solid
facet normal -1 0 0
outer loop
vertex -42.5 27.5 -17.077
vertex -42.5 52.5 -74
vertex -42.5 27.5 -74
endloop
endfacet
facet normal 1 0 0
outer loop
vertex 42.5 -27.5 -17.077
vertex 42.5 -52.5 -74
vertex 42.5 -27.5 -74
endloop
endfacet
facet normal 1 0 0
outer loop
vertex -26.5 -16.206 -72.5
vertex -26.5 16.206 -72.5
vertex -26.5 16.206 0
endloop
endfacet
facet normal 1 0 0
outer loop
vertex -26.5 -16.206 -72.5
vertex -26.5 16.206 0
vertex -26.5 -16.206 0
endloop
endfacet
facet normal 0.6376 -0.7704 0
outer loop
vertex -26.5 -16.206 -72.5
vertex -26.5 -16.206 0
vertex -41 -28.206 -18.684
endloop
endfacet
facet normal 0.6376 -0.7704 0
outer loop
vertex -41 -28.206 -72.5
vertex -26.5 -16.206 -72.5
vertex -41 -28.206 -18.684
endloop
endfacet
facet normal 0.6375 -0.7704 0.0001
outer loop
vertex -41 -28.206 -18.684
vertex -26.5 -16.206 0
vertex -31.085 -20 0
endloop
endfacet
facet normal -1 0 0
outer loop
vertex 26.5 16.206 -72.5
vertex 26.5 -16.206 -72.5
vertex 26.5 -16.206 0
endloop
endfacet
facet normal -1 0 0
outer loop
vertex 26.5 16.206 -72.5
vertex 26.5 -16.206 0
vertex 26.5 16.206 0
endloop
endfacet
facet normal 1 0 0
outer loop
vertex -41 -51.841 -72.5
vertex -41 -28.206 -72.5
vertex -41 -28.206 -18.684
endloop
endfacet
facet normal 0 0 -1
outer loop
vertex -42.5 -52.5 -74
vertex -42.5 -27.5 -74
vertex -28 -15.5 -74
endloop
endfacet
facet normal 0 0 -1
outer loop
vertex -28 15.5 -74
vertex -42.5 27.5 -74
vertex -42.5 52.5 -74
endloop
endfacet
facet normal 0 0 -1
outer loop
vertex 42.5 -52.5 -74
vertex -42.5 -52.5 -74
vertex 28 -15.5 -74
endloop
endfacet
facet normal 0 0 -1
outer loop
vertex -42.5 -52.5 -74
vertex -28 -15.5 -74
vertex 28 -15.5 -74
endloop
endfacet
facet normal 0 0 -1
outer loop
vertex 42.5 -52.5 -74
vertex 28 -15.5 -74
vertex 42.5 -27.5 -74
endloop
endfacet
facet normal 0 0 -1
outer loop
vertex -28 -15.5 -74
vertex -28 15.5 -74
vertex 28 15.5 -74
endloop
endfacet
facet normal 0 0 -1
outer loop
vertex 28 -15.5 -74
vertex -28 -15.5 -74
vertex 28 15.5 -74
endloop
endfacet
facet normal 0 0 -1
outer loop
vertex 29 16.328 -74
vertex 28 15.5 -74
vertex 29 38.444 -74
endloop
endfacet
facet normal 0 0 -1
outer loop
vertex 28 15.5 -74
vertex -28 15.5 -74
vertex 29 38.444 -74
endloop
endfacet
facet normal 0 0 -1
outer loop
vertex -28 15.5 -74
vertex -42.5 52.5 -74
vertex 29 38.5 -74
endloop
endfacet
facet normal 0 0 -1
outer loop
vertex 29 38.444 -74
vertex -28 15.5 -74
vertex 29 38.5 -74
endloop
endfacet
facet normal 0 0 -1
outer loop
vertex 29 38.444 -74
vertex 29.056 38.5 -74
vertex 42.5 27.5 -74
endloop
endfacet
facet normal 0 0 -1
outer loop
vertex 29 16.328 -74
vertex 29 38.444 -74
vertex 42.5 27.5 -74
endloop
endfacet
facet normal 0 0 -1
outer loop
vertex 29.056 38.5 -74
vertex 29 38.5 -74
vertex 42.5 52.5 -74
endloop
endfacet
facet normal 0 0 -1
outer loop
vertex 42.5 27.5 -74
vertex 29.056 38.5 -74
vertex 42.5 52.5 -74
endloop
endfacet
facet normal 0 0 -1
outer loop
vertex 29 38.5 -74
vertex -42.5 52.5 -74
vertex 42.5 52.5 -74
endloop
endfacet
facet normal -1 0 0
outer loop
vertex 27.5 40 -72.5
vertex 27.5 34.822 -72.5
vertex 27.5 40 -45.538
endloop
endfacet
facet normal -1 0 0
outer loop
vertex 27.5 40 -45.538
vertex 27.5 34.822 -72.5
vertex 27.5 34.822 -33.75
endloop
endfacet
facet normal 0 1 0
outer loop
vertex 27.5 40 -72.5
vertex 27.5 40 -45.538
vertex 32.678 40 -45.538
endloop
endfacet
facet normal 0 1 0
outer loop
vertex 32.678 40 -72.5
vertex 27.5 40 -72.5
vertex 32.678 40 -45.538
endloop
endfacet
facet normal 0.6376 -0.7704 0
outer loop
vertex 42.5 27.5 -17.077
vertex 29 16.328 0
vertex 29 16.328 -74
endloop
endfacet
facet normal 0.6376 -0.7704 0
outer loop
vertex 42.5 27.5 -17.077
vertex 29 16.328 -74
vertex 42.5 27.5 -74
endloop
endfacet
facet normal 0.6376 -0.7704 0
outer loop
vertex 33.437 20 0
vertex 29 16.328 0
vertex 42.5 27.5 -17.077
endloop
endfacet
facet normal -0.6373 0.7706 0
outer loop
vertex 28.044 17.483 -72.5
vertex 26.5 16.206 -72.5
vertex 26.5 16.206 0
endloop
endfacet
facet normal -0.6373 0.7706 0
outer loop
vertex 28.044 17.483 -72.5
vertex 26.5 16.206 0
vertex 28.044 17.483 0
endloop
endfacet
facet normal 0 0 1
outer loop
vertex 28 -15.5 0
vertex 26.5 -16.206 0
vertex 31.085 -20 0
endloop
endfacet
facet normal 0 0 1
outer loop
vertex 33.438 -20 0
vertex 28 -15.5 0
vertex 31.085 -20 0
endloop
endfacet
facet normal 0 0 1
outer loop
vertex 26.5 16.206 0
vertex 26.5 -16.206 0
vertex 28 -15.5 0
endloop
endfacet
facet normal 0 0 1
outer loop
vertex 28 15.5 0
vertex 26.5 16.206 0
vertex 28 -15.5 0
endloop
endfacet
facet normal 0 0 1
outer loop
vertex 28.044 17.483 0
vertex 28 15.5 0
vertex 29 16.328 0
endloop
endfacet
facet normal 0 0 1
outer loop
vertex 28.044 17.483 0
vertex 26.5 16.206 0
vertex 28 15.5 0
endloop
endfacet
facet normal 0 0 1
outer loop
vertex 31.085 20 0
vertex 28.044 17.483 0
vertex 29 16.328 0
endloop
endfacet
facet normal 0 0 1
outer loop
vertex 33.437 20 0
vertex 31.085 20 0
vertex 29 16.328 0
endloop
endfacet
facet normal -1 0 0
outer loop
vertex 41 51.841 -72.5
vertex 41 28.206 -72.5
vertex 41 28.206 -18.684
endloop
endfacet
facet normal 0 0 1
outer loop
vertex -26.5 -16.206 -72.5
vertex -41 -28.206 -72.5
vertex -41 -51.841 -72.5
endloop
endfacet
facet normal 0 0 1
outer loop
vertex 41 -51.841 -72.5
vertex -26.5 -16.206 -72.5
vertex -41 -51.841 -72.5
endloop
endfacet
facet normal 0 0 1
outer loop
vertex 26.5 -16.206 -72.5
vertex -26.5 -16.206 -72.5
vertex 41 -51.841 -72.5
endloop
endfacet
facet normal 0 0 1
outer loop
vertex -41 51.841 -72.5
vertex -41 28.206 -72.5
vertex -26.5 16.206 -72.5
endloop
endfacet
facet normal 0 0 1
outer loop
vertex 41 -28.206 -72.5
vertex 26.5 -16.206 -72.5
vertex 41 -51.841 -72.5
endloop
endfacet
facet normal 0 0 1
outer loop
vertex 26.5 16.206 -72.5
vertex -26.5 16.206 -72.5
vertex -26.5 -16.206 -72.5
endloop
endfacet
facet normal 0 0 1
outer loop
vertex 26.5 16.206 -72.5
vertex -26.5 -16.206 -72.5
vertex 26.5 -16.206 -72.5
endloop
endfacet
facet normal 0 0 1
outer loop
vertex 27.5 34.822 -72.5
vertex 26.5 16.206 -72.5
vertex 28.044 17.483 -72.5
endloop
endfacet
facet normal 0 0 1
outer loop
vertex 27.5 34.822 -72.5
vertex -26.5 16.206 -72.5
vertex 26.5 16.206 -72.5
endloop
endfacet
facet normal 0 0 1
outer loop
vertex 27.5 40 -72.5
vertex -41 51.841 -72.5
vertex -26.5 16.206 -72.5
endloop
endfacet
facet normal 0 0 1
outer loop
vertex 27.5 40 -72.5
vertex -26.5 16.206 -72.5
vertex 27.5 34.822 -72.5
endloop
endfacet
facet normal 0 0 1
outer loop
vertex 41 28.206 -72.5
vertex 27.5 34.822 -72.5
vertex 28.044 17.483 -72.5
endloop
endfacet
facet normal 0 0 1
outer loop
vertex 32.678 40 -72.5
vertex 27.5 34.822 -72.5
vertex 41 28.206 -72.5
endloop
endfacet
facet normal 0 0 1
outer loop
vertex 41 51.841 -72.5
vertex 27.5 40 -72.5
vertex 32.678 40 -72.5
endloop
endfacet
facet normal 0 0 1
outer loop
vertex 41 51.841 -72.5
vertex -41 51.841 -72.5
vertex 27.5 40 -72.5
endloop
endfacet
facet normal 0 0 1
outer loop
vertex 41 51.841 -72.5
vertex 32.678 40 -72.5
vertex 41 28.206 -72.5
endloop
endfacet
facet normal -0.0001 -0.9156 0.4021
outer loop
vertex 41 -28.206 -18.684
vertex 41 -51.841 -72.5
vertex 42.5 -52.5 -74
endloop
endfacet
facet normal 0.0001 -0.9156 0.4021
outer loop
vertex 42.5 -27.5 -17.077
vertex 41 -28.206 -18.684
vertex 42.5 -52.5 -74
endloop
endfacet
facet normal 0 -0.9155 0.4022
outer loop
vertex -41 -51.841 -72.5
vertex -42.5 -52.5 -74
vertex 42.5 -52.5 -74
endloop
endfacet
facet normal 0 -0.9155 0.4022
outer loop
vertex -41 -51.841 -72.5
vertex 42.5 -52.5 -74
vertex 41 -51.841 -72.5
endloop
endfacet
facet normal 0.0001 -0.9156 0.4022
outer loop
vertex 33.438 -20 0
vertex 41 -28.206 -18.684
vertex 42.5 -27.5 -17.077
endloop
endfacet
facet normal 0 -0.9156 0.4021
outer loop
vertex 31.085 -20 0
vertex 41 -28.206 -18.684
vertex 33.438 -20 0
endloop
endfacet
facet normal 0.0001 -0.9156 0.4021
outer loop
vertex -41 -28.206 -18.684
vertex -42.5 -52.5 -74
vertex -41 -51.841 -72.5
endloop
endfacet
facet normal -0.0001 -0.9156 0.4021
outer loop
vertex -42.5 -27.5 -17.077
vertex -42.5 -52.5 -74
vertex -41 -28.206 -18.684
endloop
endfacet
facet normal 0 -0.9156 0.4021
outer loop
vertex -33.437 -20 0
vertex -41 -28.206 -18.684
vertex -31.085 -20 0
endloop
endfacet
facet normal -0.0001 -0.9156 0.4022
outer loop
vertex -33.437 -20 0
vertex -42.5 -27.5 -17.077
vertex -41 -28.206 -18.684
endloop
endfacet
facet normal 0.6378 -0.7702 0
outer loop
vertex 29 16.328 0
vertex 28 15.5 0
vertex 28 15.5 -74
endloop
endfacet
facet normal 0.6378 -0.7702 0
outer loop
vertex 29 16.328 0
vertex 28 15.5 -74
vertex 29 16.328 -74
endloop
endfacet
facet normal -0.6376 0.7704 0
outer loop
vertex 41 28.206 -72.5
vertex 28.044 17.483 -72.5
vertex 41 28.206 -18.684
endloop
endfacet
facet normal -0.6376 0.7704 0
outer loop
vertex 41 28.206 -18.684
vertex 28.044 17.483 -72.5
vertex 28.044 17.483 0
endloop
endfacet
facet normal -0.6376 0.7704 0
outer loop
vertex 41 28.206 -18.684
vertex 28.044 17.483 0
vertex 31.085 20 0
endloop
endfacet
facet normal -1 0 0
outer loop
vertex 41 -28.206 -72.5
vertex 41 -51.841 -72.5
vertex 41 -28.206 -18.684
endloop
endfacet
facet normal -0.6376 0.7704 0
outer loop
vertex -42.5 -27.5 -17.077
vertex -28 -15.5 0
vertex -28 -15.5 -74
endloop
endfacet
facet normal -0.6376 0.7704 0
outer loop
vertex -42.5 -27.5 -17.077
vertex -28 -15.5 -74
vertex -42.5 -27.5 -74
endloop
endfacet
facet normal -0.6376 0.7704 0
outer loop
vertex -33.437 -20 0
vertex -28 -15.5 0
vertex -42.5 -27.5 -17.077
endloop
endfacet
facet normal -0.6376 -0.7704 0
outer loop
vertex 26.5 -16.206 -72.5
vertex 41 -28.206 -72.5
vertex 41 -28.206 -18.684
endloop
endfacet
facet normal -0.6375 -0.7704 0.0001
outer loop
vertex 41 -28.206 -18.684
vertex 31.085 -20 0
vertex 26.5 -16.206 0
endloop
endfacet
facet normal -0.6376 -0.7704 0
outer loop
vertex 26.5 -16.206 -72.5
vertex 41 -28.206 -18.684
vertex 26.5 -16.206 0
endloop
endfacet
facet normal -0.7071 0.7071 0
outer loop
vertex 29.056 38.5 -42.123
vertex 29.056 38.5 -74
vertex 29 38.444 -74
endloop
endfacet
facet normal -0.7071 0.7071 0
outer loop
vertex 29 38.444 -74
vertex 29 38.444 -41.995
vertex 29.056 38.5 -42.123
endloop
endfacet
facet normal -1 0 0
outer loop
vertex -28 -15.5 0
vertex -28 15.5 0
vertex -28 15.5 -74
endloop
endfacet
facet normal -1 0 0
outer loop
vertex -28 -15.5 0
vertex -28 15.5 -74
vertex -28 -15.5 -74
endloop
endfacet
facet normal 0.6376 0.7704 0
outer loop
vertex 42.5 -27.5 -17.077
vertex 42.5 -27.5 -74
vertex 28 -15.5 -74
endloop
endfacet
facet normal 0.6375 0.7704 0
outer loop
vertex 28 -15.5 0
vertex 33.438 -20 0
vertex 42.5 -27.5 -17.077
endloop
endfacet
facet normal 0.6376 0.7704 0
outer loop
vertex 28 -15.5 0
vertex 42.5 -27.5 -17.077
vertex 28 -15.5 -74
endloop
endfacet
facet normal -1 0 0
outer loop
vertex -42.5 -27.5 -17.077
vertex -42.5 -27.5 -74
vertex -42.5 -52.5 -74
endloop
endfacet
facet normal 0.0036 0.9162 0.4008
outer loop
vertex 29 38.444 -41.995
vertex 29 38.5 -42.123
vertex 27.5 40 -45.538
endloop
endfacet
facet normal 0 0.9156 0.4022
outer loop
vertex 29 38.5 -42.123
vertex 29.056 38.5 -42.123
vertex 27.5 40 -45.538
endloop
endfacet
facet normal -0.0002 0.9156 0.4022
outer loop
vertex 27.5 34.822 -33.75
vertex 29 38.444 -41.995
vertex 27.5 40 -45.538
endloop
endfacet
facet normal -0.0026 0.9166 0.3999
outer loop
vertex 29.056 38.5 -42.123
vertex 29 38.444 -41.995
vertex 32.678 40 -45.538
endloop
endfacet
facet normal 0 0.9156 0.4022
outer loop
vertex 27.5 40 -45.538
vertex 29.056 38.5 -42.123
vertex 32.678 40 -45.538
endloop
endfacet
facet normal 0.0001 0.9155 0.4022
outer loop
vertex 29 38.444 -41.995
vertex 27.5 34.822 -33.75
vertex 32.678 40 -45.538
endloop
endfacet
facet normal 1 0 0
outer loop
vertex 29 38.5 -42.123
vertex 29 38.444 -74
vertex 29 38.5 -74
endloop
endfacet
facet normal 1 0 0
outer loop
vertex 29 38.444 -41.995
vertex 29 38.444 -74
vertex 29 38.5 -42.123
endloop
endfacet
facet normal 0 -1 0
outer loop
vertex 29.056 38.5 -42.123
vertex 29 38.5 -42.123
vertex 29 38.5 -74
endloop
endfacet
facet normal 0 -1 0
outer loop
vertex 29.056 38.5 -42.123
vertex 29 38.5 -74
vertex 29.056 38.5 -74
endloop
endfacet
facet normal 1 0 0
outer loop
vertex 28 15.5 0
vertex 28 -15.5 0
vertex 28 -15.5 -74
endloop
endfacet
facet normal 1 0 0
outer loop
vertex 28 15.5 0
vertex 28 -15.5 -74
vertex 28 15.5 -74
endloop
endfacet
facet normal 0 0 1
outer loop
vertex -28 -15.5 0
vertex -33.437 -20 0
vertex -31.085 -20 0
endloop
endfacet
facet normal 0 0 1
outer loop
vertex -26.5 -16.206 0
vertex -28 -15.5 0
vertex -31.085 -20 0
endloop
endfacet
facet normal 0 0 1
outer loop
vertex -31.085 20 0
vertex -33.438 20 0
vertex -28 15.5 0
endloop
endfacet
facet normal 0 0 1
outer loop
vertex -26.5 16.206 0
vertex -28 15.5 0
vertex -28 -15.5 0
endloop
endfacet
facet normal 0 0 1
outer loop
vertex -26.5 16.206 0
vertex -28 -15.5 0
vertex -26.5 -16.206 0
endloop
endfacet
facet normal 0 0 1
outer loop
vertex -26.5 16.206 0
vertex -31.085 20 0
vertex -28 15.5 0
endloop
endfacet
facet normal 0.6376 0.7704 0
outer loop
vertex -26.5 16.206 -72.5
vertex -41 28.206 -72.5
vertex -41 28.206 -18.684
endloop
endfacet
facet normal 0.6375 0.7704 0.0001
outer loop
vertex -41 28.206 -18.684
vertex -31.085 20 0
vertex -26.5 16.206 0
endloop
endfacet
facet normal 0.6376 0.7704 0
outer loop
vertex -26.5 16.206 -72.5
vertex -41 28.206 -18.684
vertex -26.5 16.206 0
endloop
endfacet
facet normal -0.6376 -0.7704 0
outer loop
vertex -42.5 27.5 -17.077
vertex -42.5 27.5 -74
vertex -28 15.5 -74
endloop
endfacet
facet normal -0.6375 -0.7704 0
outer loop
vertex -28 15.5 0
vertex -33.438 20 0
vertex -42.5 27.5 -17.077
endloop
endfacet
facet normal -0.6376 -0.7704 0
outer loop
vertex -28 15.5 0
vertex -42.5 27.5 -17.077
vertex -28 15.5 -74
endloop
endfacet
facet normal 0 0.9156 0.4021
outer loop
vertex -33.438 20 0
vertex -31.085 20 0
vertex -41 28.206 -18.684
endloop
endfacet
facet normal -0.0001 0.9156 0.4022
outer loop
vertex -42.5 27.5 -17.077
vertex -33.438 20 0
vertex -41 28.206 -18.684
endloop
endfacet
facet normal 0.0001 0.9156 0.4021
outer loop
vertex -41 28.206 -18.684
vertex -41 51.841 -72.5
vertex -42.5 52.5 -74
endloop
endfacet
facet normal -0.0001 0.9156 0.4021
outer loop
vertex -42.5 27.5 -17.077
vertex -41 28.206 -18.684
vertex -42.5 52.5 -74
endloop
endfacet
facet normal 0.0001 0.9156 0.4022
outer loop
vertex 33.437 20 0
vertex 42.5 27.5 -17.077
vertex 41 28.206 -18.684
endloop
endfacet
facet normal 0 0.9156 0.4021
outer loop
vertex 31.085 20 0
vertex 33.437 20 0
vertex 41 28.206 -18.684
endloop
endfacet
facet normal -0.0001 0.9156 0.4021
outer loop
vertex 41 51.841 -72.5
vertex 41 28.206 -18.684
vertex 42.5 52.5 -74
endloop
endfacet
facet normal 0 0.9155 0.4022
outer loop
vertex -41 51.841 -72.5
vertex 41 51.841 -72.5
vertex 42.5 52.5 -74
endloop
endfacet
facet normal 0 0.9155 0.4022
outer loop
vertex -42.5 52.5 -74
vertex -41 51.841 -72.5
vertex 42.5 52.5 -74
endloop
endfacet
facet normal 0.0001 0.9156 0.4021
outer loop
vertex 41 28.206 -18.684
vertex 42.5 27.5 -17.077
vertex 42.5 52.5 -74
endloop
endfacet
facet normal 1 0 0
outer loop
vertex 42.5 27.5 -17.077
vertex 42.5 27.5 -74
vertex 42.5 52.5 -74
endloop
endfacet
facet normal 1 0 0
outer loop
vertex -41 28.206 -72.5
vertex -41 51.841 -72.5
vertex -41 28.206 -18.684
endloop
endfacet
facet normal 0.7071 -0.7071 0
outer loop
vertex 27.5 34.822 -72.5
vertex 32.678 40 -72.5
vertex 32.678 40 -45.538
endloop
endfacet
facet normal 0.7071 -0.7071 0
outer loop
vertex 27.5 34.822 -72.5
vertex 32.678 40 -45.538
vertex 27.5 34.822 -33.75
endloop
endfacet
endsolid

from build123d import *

# Parameters (mm, degrees)
F1_DEPTH = 74
F3_DEPTH = 50
F4_T     = -1.5


with BuildPart() as f1:
    # F0 (on Top) → F1 (new body)
    with BuildSketch(Plane.XY):
        Polygon((42.5, 27.5), (42.5, 52.5), (-42.5, 52.5), (-42.5, 27.5), (-28, 15.5), (-28, -15.5), (-42.5, -27.5), (-42.5, -52.5), (42.5, -52.5), (42.5, -27.5), (28, -15.5), (28, 15.5), (29, 16.3275862069), align=None)
        with BuildLine():
            Line((-34.6619805153, -37.7418373828), (-29.712233047, -32.7920899145))
            ThreePointArc((-29.712233047, -32.7920899145), (-23.3482720164, -32.7920899145), (-23.3482720164, -39.1560509451))
            Line((-23.3482720164, -39.1560509451), (-28.2980194847, -44.1057984134))
            ThreePointArc((-28.2980194847, -44.1057984134), (-34.6619805153, -44.1057984134), (-34.6619805153, -37.7418373828))
        make_face(mode=Mode.SUBTRACT)
        with BuildLine():
            ThreePointArc((34.6619805153, -37.7418373828), (34.6619805153, -44.1057984134), (28.2980194847, -44.1057984134))
            Line((28.2980194847, -44.1057984134), (23.3482720164, -39.1560509451))
            ThreePointArc((23.3482720164, -39.1560509451), (23.3482720164, -32.7920899145), (29.712233047, -32.7920899145))
            Line((29.712233047, -32.7920899145), (34.6619805153, -37.7418373828))
        make_face(mode=Mode.SUBTRACT)
        with BuildLine():
            ThreePointArc((-34.6619805153, 37.7418373828), (-34.6619805153, 44.1057984134), (-28.2980194847, 44.1057984134))
            Line((-28.2980194847, 44.1057984134), (-23.3482720164, 39.1560509451))
            ThreePointArc((-23.3482720164, 39.1560509451), (-23.3482720164, 32.7920899145), (-29.712233047, 32.7920899145))
            Line((-29.712233047, 32.7920899145), (-34.6619805153, 37.7418373828))
        make_face(mode=Mode.SUBTRACT)
        with BuildLine():
            ThreePointArc((29.712233047, 32.7920899145), (29.3709433721, 32.4840166266), (29, 32.2123756731))
            ThreePointArc((29, 32.2123756731), (23.3244813451, 32.8160598061), (22.8060506298, 38.5))
            ThreePointArc((22.8060506298, 38.5), (23.0616159687, 38.8408735961), (23.3482720164, 39.1560509451))
            Line((23.3482720164, 39.1560509451), (28.2980194847, 44.1057984134))
            ThreePointArc((28.2980194847, 44.1057984134), (28.6345514487, 44.4099938176), (29, 44.6787613065))
            ThreePointArc((29, 44.6787613065), (34.6382034894, 44.1293990809), (35.2714518059, 38.5))
            ThreePointArc((35.2714518059, 38.5), (34.9872627822, 38.1044016861), (34.6619805153, 37.7418373828))
            Line((34.6619805153, 37.7418373828), (29.712233047, 32.7920899145))
        make_face(mode=Mode.SUBTRACT)
        with BuildLine():
            Line((23.3482720164, -39.1560509451), (28.2980194847, -44.1057984134))
            ThreePointArc((28.2980194847, -44.1057984134), (34.6619805153, -44.1057984134), (34.6619805153, -37.7418373828))
            Line((34.6619805153, -37.7418373828), (29.712233047, -32.7920899145))
            ThreePointArc((29.712233047, -32.7920899145), (23.3482720164, -32.7920899145), (23.3482720164, -39.1560509451))
        make_face()
        with BuildLine():
            Line((-23.3482720164, 39.1560509451), (-28.2980194847, 44.1057984134))
            ThreePointArc((-28.2980194847, 44.1057984134), (-34.6619805153, 44.1057984134), (-34.6619805153, 37.7418373828))
            Line((-34.6619805153, 37.7418373828), (-29.712233047, 32.7920899145))
            ThreePointArc((-29.712233047, 32.7920899145), (-23.3482720164, 32.7920899145), (-23.3482720164, 39.1560509451))
        make_face()
        with BuildLine():
            ThreePointArc((-23.3482720164, -39.1560509451), (-23.3482720164, -32.7920899145), (-29.712233047, -32.7920899145))
            Line((-29.712233047, -32.7920899145), (-34.6619805153, -37.7418373828))
            ThreePointArc((-34.6619805153, -37.7418373828), (-34.6619805153, -44.1057984134), (-28.2980194847, -44.1057984134))
            Line((-28.2980194847, -44.1057984134), (-23.3482720164, -39.1560509451))
        make_face()
        with BuildLine():
            Line((29, 38.4438178981), (29, 32.2123756731))
            ThreePointArc((29, 32.2123756731), (29.3709433721, 32.4840166266), (29.712233047, 32.7920899145))
            Line((29.712233047, 32.7920899145), (34.6619805153, 37.7418373828))
            ThreePointArc((34.6619805153, 37.7418373828), (34.9872627822, 38.1044016861), (35.2714518059, 38.5))
            Line((35.2714518059, 38.5), (29.0561821019, 38.5))
            Line((29.0561821019, 38.5), (29, 38.4438178981))
        make_face()
        with BuildLine():
            ThreePointArc((22.8060506298, 38.5), (23.3244813451, 32.8160598061), (29, 32.2123756731))
            Line((29, 32.2123756731), (29, 38.4438178981))
            Line((29, 38.4438178981), (29, 38.5))
            Line((29, 38.5), (22.8060506298, 38.5))
        make_face()
        with BuildLine():
            Line((29, 38.5), (29.0561821019, 38.5))
            Line((29.0561821019, 38.5), (35.2714518059, 38.5))
            ThreePointArc((35.2714518059, 38.5), (34.6382034894, 44.1293990809), (29, 44.6787613065))
            Line((29, 44.6787613065), (29, 38.5))
        make_face()
        with BuildLine():
            ThreePointArc((23.3482720164, 39.1560509451), (23.0616159687, 38.8408735961), (22.8060506298, 38.5))
            Line((22.8060506298, 38.5), (29, 38.5))
            Line((29, 38.5), (29, 44.6787613065))
            ThreePointArc((29, 44.6787613065), (28.6345514487, 44.4099938176), (28.2980194847, 44.1057984134))
            Line((28.2980194847, 44.1057984134), (23.3482720164, 39.1560509451))
        make_face()
    extrude(amount=-F1_DEPTH)

    # F2 (on Right) → F3 (cut, symmetric)
    with BuildSketch(Plane.YZ):
        Polygon((-52.5, 0), (-52.5, -74), (-20, 0), align=None)
        Polygon((52.8937540948, 0), (20, 0), (52.5, -74), align=None)
    extrude(amount=F3_DEPTH, both=True, mode=Mode.SUBTRACT)

    # F4
    f4_openings = [f1.faces().sort_by_distance(p)[0] for p in [
        (0, 0, 0),
        (0, -36.59684, -37.789727),
        (-1.7e-05, 36.596839, -37.789725),
    ]]
    offset(amount=F4_T, openings=f4_openings, kind=Kind.INTERSECTION)


solid = f1.part
